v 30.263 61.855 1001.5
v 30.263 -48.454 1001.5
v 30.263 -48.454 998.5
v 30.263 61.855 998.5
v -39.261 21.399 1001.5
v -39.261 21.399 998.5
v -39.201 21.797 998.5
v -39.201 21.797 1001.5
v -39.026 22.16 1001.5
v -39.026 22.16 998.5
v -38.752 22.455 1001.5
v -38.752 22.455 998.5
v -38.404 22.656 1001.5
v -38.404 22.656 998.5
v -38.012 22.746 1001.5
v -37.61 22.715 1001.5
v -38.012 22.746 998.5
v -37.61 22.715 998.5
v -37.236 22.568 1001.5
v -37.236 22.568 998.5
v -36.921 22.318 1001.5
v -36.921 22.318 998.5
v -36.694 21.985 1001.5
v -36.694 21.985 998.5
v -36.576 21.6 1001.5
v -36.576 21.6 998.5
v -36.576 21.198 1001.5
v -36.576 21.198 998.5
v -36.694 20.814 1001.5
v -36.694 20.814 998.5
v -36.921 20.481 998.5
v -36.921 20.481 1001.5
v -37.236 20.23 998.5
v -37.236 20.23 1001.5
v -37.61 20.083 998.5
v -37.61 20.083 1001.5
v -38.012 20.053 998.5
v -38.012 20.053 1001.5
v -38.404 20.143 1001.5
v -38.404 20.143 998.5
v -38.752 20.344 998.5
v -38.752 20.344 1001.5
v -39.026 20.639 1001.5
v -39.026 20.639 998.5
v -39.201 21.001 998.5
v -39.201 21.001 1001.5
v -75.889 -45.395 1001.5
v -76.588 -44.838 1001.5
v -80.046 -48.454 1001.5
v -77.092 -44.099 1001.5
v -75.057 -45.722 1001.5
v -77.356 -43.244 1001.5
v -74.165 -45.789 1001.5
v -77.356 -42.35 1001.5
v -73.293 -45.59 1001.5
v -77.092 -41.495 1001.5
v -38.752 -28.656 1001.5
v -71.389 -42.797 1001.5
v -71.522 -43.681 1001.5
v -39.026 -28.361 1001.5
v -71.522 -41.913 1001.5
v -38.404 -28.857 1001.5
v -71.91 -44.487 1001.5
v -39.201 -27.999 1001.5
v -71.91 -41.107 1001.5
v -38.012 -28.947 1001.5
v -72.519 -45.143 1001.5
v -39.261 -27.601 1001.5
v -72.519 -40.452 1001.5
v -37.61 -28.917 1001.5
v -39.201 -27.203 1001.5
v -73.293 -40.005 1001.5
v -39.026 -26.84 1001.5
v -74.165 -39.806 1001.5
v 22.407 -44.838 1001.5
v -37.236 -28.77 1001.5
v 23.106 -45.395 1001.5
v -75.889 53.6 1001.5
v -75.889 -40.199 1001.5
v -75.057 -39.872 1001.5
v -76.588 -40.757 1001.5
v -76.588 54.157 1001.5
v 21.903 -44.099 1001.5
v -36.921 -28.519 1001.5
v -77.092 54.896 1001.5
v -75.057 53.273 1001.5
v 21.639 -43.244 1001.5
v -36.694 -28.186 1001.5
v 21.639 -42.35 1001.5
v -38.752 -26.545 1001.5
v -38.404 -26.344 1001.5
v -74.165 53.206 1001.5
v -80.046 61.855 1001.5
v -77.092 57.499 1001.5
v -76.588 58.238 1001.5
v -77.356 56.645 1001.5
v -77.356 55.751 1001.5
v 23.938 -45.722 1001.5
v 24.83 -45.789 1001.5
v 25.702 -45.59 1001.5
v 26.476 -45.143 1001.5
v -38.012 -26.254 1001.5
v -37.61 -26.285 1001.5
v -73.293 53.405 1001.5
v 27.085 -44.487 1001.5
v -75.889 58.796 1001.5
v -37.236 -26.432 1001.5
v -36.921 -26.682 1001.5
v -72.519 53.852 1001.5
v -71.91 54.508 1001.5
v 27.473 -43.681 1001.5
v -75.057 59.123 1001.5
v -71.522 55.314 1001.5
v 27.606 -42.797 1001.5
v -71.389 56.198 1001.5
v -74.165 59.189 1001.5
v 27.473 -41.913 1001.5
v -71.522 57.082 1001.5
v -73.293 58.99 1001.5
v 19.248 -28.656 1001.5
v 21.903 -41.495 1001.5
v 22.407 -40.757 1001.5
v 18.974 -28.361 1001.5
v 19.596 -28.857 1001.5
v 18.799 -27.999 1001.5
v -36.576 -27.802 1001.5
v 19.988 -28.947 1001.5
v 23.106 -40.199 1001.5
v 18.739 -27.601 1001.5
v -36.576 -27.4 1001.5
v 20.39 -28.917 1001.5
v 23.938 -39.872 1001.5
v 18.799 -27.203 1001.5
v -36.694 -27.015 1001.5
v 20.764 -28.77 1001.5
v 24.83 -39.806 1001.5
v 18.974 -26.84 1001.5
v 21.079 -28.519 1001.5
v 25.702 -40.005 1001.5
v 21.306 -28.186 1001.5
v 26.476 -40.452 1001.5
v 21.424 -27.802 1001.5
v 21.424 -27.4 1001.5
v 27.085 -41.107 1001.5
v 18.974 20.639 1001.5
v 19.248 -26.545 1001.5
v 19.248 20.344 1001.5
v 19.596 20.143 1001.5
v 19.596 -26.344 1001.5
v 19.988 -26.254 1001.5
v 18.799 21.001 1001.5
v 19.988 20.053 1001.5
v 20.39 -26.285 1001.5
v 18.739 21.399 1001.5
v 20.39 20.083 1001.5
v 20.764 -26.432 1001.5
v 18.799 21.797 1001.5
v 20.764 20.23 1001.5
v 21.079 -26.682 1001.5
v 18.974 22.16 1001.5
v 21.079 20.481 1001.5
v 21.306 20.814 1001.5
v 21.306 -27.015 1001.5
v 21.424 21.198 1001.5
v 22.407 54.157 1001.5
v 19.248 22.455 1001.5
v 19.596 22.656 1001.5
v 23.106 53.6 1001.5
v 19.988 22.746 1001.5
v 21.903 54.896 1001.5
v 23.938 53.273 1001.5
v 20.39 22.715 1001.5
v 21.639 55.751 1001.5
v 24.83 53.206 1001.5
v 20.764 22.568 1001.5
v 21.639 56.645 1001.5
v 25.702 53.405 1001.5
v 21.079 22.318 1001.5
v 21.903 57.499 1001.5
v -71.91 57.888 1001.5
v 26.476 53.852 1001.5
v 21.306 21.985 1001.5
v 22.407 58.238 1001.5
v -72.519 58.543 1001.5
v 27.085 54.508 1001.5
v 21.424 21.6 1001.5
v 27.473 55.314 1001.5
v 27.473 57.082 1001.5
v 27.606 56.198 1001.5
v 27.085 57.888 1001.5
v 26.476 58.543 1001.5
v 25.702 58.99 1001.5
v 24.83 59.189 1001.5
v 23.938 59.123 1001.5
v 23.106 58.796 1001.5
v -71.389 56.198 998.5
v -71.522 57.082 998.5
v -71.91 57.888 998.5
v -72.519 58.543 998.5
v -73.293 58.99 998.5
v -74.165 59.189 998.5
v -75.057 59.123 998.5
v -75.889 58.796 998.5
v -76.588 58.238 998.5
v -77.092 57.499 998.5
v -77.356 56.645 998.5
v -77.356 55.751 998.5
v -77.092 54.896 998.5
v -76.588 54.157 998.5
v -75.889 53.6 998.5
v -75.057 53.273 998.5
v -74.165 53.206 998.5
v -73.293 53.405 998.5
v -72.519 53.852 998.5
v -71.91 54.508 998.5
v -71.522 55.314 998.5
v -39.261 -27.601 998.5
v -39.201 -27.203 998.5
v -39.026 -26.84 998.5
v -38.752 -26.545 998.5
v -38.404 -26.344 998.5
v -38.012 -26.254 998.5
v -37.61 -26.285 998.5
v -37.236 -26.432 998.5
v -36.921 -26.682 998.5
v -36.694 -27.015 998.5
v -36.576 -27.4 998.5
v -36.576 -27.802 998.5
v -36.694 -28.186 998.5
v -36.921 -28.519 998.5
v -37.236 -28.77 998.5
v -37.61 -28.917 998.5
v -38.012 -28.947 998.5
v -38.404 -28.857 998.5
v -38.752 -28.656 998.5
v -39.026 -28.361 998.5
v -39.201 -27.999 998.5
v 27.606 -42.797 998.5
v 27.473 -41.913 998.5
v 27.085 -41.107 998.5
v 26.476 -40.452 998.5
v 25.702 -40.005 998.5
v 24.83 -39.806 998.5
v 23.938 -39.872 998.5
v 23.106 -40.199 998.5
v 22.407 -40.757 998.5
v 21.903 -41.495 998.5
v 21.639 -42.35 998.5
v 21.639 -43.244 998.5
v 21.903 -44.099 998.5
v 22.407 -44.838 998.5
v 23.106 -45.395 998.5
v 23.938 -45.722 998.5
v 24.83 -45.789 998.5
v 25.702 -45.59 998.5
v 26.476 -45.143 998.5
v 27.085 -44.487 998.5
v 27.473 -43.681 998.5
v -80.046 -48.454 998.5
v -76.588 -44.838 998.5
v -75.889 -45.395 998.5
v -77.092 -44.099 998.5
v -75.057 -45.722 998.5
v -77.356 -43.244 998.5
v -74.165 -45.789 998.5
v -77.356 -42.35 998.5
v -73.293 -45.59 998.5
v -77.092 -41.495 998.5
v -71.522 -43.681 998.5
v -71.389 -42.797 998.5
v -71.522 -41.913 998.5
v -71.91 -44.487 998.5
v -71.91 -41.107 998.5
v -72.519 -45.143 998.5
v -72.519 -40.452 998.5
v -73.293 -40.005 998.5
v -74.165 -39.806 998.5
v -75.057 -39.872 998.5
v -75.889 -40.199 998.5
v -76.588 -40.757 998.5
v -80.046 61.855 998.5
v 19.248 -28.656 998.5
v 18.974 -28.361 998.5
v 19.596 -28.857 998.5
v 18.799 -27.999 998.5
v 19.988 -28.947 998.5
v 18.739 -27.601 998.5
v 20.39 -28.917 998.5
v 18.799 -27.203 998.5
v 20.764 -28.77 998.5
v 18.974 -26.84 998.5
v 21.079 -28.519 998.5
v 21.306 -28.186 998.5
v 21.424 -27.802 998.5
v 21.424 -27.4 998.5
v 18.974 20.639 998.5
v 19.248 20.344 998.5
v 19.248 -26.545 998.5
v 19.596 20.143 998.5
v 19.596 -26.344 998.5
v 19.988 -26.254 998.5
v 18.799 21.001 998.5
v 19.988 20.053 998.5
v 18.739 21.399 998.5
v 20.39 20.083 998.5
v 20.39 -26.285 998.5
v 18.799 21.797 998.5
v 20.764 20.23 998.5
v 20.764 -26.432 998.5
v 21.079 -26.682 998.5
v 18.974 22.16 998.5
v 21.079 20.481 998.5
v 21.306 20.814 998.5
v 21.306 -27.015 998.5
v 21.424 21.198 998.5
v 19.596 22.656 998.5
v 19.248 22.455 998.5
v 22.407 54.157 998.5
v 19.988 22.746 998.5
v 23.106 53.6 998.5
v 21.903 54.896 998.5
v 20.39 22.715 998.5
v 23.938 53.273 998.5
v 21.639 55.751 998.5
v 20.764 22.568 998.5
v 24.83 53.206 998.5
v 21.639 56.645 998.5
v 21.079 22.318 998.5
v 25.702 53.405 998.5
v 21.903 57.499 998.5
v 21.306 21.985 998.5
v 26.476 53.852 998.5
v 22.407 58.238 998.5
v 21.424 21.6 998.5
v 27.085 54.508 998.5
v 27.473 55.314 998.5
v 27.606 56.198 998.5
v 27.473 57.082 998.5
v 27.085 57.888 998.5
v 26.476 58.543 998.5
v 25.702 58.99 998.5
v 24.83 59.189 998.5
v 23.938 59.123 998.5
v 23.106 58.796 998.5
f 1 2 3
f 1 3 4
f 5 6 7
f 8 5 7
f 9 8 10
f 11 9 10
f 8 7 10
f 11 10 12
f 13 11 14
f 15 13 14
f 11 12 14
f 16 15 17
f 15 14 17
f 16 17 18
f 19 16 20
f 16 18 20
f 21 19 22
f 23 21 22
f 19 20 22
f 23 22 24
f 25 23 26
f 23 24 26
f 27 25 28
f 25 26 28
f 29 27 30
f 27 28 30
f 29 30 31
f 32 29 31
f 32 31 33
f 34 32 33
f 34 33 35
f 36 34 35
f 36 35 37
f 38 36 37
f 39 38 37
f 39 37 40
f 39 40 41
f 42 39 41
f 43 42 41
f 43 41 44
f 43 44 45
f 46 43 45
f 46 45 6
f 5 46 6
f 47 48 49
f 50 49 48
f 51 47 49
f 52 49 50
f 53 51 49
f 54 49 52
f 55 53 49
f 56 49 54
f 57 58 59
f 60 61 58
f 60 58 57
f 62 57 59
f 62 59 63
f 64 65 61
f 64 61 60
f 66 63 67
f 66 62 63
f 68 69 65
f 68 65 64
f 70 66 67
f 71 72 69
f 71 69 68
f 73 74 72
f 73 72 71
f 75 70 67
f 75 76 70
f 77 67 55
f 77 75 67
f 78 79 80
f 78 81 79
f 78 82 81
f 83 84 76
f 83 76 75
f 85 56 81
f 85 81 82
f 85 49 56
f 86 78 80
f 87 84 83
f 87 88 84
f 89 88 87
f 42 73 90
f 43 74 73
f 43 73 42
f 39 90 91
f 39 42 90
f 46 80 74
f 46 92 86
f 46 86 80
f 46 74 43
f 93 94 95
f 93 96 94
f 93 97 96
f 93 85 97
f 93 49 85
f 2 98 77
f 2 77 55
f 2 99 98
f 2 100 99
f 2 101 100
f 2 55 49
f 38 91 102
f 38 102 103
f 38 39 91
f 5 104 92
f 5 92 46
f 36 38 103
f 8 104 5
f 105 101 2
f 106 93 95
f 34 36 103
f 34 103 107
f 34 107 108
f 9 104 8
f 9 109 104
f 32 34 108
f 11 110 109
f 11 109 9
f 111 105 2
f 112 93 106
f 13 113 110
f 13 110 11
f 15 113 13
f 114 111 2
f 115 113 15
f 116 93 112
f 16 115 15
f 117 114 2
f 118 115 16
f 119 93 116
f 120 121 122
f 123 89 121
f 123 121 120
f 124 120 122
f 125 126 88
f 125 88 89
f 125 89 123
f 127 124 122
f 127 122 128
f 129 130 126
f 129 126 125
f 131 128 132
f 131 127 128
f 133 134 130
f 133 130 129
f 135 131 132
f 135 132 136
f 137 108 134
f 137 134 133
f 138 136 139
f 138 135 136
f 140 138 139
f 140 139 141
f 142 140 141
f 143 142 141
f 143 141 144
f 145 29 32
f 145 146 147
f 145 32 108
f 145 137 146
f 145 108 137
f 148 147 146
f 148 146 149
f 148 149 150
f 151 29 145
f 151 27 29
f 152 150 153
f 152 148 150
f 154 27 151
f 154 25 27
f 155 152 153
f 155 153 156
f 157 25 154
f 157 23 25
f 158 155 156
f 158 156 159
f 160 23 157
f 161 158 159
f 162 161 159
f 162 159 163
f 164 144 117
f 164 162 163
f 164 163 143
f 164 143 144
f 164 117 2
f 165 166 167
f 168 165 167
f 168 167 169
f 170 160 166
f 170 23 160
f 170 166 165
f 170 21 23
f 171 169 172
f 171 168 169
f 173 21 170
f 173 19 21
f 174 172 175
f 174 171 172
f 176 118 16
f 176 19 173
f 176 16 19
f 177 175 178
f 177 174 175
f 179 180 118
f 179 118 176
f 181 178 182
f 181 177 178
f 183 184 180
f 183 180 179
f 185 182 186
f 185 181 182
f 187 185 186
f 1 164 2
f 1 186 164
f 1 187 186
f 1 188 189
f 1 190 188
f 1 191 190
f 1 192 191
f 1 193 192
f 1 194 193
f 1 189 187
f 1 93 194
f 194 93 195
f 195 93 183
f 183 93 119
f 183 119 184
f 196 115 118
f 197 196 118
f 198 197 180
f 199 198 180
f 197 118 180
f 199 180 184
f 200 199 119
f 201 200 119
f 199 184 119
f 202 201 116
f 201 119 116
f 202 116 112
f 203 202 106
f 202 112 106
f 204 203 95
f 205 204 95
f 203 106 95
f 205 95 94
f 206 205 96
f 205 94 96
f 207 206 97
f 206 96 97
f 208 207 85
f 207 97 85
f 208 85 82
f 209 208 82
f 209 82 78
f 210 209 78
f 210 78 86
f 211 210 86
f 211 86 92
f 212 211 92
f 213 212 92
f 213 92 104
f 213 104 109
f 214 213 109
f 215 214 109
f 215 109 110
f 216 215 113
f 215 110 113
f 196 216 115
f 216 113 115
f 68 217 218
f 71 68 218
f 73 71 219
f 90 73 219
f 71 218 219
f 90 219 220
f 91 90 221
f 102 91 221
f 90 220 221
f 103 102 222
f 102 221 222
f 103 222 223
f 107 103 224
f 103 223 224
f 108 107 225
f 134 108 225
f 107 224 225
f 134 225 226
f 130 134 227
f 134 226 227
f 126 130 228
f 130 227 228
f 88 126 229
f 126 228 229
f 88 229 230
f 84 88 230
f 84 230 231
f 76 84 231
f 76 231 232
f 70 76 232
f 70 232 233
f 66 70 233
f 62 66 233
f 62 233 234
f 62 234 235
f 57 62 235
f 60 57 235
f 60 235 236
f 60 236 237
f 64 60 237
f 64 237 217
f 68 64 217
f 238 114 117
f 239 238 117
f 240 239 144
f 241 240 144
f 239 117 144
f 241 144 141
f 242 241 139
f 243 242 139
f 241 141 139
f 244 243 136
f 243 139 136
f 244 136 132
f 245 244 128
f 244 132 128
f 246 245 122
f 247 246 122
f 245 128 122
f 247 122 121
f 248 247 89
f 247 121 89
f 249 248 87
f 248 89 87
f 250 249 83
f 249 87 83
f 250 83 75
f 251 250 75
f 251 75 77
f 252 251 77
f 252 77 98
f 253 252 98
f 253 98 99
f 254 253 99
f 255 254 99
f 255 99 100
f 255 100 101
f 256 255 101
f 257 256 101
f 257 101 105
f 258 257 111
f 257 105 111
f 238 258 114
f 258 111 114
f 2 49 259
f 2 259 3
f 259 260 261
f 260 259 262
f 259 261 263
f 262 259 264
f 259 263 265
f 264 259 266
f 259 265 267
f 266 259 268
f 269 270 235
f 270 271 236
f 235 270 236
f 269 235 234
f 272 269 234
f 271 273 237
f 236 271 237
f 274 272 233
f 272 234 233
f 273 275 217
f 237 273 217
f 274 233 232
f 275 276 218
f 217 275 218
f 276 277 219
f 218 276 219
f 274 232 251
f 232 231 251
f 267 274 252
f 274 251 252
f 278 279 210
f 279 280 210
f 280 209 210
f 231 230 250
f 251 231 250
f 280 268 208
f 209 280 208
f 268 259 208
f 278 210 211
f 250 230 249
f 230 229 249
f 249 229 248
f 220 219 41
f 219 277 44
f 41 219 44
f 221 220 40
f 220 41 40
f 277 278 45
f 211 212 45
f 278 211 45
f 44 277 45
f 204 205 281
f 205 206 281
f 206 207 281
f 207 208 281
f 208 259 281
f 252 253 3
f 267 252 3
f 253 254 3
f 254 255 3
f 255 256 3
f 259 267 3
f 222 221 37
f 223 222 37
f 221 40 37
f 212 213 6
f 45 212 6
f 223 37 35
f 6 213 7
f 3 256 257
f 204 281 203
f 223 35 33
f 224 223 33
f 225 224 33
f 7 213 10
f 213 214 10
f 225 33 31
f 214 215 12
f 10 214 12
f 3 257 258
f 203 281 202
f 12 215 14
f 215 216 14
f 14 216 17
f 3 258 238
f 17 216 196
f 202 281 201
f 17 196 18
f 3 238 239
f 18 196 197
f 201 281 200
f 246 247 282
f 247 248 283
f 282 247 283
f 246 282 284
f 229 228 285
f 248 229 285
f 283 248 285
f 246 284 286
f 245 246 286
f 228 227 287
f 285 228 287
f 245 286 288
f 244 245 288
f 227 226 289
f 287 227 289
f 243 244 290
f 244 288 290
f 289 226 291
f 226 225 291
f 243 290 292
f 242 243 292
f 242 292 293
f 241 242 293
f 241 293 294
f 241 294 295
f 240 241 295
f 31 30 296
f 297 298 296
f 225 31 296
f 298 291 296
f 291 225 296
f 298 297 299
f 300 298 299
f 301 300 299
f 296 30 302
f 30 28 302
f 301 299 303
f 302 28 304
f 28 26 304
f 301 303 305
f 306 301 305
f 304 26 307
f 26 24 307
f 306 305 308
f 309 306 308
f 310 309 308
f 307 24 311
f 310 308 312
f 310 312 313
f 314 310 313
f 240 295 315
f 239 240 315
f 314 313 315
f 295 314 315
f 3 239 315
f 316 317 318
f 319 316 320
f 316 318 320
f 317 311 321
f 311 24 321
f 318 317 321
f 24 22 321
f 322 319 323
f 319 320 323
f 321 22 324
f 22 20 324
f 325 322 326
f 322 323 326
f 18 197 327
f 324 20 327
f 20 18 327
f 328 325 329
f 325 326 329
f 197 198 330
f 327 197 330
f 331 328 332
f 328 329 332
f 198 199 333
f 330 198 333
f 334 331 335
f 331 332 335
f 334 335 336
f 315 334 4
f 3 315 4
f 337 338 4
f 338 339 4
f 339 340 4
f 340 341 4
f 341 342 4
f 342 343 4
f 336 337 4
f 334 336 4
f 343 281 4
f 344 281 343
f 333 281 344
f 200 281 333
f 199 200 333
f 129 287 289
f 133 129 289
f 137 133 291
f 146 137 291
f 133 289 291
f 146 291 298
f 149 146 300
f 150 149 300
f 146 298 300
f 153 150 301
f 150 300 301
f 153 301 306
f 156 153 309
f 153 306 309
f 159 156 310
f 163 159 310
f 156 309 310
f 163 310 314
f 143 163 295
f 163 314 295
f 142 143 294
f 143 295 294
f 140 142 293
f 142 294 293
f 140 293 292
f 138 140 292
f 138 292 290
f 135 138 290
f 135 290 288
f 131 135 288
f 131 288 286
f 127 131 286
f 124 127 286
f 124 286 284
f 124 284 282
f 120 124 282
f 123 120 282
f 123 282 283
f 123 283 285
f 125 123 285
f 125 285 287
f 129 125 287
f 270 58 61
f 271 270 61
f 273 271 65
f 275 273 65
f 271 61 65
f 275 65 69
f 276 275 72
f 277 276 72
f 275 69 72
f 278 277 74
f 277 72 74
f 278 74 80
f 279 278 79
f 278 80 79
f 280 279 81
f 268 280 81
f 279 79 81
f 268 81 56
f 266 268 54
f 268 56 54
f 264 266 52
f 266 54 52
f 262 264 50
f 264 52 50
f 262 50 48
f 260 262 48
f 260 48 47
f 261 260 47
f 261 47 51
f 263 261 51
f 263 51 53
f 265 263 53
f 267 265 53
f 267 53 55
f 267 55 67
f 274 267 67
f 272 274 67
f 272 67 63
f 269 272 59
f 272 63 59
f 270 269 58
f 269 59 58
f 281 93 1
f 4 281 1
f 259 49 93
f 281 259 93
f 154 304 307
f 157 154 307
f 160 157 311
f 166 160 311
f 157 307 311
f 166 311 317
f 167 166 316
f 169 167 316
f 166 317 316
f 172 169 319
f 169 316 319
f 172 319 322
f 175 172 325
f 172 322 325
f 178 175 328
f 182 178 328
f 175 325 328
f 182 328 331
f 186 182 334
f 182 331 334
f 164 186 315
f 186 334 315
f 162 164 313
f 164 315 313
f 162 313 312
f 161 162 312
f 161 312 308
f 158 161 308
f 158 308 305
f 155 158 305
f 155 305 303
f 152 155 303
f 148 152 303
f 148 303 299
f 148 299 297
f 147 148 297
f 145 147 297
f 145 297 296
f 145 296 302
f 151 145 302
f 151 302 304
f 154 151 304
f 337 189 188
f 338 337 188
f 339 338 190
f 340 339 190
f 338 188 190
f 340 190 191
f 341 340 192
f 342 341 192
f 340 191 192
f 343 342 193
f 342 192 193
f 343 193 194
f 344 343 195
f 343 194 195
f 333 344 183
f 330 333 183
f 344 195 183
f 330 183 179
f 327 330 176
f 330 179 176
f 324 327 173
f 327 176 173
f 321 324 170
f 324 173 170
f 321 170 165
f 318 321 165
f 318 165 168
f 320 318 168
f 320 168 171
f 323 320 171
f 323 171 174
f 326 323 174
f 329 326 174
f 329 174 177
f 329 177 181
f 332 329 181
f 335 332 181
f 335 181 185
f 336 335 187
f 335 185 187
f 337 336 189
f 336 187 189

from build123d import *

# Parameters (mm, degrees)
CROQUIS1_W              = 110.308657865
CROQUIS1_H              = 110.308657865
CROQUIS1_R              = 3
SALIENTE_EXTRUIR1_DEPTH = 3
CROQUIS3_R              = 1.35
CORTAR_EXTRUIR1_DEPTH   = 4


with BuildPart() as part:
    # Croquis1 → Saliente-Extruir1 (new body)
    with BuildSketch(Plane.XY.offset(1001.5)):
        with Locations((-24.891577249, 6.700344828)):
            Rectangle(CROQUIS1_W, CROQUIS1_H)
        with Locations((-74.389051931, 56.197819511)):
            Circle(CROQUIS1_R, mode=Mode.SUBTRACT)
        with Locations((24.605897435, -42.797129855)):
            Circle(CROQUIS1_R, mode=Mode.SUBTRACT)
        with Locations((-74.389051931, -42.797129855)):
            Circle(CROQUIS1_R, mode=Mode.SUBTRACT)
        with Locations((24.605897435, 56.197819511)):
            Circle(CROQUIS1_R, mode=Mode.SUBTRACT)
    extrude(amount=-SALIENTE_EXTRUIR1_DEPTH)

    # Croquis3 → Cortar-Extruir1 (cut, through all)
    with BuildSketch(Plane(origin=(0, 0, 998.5), x_dir=(-1, 0, 0), z_dir=(0, 0, -1))):
        with Locations((37.910718234, 21.399287334)):
            Circle(CROQUIS3_R)
        with Locations((37.910718234, -27.600712666)):
            Circle(CROQUIS3_R)
        with Locations((-20.089281766, -27.600712666)):
            Circle(CROQUIS3_R)
        with Locations((-20.089281766, 21.399287334)):
            Circle(CROQUIS3_R)
    extrude(amount=-CORTAR_EXTRUIR1_DEPTH, mode=Mode.SUBTRACT)


solid = part.part
